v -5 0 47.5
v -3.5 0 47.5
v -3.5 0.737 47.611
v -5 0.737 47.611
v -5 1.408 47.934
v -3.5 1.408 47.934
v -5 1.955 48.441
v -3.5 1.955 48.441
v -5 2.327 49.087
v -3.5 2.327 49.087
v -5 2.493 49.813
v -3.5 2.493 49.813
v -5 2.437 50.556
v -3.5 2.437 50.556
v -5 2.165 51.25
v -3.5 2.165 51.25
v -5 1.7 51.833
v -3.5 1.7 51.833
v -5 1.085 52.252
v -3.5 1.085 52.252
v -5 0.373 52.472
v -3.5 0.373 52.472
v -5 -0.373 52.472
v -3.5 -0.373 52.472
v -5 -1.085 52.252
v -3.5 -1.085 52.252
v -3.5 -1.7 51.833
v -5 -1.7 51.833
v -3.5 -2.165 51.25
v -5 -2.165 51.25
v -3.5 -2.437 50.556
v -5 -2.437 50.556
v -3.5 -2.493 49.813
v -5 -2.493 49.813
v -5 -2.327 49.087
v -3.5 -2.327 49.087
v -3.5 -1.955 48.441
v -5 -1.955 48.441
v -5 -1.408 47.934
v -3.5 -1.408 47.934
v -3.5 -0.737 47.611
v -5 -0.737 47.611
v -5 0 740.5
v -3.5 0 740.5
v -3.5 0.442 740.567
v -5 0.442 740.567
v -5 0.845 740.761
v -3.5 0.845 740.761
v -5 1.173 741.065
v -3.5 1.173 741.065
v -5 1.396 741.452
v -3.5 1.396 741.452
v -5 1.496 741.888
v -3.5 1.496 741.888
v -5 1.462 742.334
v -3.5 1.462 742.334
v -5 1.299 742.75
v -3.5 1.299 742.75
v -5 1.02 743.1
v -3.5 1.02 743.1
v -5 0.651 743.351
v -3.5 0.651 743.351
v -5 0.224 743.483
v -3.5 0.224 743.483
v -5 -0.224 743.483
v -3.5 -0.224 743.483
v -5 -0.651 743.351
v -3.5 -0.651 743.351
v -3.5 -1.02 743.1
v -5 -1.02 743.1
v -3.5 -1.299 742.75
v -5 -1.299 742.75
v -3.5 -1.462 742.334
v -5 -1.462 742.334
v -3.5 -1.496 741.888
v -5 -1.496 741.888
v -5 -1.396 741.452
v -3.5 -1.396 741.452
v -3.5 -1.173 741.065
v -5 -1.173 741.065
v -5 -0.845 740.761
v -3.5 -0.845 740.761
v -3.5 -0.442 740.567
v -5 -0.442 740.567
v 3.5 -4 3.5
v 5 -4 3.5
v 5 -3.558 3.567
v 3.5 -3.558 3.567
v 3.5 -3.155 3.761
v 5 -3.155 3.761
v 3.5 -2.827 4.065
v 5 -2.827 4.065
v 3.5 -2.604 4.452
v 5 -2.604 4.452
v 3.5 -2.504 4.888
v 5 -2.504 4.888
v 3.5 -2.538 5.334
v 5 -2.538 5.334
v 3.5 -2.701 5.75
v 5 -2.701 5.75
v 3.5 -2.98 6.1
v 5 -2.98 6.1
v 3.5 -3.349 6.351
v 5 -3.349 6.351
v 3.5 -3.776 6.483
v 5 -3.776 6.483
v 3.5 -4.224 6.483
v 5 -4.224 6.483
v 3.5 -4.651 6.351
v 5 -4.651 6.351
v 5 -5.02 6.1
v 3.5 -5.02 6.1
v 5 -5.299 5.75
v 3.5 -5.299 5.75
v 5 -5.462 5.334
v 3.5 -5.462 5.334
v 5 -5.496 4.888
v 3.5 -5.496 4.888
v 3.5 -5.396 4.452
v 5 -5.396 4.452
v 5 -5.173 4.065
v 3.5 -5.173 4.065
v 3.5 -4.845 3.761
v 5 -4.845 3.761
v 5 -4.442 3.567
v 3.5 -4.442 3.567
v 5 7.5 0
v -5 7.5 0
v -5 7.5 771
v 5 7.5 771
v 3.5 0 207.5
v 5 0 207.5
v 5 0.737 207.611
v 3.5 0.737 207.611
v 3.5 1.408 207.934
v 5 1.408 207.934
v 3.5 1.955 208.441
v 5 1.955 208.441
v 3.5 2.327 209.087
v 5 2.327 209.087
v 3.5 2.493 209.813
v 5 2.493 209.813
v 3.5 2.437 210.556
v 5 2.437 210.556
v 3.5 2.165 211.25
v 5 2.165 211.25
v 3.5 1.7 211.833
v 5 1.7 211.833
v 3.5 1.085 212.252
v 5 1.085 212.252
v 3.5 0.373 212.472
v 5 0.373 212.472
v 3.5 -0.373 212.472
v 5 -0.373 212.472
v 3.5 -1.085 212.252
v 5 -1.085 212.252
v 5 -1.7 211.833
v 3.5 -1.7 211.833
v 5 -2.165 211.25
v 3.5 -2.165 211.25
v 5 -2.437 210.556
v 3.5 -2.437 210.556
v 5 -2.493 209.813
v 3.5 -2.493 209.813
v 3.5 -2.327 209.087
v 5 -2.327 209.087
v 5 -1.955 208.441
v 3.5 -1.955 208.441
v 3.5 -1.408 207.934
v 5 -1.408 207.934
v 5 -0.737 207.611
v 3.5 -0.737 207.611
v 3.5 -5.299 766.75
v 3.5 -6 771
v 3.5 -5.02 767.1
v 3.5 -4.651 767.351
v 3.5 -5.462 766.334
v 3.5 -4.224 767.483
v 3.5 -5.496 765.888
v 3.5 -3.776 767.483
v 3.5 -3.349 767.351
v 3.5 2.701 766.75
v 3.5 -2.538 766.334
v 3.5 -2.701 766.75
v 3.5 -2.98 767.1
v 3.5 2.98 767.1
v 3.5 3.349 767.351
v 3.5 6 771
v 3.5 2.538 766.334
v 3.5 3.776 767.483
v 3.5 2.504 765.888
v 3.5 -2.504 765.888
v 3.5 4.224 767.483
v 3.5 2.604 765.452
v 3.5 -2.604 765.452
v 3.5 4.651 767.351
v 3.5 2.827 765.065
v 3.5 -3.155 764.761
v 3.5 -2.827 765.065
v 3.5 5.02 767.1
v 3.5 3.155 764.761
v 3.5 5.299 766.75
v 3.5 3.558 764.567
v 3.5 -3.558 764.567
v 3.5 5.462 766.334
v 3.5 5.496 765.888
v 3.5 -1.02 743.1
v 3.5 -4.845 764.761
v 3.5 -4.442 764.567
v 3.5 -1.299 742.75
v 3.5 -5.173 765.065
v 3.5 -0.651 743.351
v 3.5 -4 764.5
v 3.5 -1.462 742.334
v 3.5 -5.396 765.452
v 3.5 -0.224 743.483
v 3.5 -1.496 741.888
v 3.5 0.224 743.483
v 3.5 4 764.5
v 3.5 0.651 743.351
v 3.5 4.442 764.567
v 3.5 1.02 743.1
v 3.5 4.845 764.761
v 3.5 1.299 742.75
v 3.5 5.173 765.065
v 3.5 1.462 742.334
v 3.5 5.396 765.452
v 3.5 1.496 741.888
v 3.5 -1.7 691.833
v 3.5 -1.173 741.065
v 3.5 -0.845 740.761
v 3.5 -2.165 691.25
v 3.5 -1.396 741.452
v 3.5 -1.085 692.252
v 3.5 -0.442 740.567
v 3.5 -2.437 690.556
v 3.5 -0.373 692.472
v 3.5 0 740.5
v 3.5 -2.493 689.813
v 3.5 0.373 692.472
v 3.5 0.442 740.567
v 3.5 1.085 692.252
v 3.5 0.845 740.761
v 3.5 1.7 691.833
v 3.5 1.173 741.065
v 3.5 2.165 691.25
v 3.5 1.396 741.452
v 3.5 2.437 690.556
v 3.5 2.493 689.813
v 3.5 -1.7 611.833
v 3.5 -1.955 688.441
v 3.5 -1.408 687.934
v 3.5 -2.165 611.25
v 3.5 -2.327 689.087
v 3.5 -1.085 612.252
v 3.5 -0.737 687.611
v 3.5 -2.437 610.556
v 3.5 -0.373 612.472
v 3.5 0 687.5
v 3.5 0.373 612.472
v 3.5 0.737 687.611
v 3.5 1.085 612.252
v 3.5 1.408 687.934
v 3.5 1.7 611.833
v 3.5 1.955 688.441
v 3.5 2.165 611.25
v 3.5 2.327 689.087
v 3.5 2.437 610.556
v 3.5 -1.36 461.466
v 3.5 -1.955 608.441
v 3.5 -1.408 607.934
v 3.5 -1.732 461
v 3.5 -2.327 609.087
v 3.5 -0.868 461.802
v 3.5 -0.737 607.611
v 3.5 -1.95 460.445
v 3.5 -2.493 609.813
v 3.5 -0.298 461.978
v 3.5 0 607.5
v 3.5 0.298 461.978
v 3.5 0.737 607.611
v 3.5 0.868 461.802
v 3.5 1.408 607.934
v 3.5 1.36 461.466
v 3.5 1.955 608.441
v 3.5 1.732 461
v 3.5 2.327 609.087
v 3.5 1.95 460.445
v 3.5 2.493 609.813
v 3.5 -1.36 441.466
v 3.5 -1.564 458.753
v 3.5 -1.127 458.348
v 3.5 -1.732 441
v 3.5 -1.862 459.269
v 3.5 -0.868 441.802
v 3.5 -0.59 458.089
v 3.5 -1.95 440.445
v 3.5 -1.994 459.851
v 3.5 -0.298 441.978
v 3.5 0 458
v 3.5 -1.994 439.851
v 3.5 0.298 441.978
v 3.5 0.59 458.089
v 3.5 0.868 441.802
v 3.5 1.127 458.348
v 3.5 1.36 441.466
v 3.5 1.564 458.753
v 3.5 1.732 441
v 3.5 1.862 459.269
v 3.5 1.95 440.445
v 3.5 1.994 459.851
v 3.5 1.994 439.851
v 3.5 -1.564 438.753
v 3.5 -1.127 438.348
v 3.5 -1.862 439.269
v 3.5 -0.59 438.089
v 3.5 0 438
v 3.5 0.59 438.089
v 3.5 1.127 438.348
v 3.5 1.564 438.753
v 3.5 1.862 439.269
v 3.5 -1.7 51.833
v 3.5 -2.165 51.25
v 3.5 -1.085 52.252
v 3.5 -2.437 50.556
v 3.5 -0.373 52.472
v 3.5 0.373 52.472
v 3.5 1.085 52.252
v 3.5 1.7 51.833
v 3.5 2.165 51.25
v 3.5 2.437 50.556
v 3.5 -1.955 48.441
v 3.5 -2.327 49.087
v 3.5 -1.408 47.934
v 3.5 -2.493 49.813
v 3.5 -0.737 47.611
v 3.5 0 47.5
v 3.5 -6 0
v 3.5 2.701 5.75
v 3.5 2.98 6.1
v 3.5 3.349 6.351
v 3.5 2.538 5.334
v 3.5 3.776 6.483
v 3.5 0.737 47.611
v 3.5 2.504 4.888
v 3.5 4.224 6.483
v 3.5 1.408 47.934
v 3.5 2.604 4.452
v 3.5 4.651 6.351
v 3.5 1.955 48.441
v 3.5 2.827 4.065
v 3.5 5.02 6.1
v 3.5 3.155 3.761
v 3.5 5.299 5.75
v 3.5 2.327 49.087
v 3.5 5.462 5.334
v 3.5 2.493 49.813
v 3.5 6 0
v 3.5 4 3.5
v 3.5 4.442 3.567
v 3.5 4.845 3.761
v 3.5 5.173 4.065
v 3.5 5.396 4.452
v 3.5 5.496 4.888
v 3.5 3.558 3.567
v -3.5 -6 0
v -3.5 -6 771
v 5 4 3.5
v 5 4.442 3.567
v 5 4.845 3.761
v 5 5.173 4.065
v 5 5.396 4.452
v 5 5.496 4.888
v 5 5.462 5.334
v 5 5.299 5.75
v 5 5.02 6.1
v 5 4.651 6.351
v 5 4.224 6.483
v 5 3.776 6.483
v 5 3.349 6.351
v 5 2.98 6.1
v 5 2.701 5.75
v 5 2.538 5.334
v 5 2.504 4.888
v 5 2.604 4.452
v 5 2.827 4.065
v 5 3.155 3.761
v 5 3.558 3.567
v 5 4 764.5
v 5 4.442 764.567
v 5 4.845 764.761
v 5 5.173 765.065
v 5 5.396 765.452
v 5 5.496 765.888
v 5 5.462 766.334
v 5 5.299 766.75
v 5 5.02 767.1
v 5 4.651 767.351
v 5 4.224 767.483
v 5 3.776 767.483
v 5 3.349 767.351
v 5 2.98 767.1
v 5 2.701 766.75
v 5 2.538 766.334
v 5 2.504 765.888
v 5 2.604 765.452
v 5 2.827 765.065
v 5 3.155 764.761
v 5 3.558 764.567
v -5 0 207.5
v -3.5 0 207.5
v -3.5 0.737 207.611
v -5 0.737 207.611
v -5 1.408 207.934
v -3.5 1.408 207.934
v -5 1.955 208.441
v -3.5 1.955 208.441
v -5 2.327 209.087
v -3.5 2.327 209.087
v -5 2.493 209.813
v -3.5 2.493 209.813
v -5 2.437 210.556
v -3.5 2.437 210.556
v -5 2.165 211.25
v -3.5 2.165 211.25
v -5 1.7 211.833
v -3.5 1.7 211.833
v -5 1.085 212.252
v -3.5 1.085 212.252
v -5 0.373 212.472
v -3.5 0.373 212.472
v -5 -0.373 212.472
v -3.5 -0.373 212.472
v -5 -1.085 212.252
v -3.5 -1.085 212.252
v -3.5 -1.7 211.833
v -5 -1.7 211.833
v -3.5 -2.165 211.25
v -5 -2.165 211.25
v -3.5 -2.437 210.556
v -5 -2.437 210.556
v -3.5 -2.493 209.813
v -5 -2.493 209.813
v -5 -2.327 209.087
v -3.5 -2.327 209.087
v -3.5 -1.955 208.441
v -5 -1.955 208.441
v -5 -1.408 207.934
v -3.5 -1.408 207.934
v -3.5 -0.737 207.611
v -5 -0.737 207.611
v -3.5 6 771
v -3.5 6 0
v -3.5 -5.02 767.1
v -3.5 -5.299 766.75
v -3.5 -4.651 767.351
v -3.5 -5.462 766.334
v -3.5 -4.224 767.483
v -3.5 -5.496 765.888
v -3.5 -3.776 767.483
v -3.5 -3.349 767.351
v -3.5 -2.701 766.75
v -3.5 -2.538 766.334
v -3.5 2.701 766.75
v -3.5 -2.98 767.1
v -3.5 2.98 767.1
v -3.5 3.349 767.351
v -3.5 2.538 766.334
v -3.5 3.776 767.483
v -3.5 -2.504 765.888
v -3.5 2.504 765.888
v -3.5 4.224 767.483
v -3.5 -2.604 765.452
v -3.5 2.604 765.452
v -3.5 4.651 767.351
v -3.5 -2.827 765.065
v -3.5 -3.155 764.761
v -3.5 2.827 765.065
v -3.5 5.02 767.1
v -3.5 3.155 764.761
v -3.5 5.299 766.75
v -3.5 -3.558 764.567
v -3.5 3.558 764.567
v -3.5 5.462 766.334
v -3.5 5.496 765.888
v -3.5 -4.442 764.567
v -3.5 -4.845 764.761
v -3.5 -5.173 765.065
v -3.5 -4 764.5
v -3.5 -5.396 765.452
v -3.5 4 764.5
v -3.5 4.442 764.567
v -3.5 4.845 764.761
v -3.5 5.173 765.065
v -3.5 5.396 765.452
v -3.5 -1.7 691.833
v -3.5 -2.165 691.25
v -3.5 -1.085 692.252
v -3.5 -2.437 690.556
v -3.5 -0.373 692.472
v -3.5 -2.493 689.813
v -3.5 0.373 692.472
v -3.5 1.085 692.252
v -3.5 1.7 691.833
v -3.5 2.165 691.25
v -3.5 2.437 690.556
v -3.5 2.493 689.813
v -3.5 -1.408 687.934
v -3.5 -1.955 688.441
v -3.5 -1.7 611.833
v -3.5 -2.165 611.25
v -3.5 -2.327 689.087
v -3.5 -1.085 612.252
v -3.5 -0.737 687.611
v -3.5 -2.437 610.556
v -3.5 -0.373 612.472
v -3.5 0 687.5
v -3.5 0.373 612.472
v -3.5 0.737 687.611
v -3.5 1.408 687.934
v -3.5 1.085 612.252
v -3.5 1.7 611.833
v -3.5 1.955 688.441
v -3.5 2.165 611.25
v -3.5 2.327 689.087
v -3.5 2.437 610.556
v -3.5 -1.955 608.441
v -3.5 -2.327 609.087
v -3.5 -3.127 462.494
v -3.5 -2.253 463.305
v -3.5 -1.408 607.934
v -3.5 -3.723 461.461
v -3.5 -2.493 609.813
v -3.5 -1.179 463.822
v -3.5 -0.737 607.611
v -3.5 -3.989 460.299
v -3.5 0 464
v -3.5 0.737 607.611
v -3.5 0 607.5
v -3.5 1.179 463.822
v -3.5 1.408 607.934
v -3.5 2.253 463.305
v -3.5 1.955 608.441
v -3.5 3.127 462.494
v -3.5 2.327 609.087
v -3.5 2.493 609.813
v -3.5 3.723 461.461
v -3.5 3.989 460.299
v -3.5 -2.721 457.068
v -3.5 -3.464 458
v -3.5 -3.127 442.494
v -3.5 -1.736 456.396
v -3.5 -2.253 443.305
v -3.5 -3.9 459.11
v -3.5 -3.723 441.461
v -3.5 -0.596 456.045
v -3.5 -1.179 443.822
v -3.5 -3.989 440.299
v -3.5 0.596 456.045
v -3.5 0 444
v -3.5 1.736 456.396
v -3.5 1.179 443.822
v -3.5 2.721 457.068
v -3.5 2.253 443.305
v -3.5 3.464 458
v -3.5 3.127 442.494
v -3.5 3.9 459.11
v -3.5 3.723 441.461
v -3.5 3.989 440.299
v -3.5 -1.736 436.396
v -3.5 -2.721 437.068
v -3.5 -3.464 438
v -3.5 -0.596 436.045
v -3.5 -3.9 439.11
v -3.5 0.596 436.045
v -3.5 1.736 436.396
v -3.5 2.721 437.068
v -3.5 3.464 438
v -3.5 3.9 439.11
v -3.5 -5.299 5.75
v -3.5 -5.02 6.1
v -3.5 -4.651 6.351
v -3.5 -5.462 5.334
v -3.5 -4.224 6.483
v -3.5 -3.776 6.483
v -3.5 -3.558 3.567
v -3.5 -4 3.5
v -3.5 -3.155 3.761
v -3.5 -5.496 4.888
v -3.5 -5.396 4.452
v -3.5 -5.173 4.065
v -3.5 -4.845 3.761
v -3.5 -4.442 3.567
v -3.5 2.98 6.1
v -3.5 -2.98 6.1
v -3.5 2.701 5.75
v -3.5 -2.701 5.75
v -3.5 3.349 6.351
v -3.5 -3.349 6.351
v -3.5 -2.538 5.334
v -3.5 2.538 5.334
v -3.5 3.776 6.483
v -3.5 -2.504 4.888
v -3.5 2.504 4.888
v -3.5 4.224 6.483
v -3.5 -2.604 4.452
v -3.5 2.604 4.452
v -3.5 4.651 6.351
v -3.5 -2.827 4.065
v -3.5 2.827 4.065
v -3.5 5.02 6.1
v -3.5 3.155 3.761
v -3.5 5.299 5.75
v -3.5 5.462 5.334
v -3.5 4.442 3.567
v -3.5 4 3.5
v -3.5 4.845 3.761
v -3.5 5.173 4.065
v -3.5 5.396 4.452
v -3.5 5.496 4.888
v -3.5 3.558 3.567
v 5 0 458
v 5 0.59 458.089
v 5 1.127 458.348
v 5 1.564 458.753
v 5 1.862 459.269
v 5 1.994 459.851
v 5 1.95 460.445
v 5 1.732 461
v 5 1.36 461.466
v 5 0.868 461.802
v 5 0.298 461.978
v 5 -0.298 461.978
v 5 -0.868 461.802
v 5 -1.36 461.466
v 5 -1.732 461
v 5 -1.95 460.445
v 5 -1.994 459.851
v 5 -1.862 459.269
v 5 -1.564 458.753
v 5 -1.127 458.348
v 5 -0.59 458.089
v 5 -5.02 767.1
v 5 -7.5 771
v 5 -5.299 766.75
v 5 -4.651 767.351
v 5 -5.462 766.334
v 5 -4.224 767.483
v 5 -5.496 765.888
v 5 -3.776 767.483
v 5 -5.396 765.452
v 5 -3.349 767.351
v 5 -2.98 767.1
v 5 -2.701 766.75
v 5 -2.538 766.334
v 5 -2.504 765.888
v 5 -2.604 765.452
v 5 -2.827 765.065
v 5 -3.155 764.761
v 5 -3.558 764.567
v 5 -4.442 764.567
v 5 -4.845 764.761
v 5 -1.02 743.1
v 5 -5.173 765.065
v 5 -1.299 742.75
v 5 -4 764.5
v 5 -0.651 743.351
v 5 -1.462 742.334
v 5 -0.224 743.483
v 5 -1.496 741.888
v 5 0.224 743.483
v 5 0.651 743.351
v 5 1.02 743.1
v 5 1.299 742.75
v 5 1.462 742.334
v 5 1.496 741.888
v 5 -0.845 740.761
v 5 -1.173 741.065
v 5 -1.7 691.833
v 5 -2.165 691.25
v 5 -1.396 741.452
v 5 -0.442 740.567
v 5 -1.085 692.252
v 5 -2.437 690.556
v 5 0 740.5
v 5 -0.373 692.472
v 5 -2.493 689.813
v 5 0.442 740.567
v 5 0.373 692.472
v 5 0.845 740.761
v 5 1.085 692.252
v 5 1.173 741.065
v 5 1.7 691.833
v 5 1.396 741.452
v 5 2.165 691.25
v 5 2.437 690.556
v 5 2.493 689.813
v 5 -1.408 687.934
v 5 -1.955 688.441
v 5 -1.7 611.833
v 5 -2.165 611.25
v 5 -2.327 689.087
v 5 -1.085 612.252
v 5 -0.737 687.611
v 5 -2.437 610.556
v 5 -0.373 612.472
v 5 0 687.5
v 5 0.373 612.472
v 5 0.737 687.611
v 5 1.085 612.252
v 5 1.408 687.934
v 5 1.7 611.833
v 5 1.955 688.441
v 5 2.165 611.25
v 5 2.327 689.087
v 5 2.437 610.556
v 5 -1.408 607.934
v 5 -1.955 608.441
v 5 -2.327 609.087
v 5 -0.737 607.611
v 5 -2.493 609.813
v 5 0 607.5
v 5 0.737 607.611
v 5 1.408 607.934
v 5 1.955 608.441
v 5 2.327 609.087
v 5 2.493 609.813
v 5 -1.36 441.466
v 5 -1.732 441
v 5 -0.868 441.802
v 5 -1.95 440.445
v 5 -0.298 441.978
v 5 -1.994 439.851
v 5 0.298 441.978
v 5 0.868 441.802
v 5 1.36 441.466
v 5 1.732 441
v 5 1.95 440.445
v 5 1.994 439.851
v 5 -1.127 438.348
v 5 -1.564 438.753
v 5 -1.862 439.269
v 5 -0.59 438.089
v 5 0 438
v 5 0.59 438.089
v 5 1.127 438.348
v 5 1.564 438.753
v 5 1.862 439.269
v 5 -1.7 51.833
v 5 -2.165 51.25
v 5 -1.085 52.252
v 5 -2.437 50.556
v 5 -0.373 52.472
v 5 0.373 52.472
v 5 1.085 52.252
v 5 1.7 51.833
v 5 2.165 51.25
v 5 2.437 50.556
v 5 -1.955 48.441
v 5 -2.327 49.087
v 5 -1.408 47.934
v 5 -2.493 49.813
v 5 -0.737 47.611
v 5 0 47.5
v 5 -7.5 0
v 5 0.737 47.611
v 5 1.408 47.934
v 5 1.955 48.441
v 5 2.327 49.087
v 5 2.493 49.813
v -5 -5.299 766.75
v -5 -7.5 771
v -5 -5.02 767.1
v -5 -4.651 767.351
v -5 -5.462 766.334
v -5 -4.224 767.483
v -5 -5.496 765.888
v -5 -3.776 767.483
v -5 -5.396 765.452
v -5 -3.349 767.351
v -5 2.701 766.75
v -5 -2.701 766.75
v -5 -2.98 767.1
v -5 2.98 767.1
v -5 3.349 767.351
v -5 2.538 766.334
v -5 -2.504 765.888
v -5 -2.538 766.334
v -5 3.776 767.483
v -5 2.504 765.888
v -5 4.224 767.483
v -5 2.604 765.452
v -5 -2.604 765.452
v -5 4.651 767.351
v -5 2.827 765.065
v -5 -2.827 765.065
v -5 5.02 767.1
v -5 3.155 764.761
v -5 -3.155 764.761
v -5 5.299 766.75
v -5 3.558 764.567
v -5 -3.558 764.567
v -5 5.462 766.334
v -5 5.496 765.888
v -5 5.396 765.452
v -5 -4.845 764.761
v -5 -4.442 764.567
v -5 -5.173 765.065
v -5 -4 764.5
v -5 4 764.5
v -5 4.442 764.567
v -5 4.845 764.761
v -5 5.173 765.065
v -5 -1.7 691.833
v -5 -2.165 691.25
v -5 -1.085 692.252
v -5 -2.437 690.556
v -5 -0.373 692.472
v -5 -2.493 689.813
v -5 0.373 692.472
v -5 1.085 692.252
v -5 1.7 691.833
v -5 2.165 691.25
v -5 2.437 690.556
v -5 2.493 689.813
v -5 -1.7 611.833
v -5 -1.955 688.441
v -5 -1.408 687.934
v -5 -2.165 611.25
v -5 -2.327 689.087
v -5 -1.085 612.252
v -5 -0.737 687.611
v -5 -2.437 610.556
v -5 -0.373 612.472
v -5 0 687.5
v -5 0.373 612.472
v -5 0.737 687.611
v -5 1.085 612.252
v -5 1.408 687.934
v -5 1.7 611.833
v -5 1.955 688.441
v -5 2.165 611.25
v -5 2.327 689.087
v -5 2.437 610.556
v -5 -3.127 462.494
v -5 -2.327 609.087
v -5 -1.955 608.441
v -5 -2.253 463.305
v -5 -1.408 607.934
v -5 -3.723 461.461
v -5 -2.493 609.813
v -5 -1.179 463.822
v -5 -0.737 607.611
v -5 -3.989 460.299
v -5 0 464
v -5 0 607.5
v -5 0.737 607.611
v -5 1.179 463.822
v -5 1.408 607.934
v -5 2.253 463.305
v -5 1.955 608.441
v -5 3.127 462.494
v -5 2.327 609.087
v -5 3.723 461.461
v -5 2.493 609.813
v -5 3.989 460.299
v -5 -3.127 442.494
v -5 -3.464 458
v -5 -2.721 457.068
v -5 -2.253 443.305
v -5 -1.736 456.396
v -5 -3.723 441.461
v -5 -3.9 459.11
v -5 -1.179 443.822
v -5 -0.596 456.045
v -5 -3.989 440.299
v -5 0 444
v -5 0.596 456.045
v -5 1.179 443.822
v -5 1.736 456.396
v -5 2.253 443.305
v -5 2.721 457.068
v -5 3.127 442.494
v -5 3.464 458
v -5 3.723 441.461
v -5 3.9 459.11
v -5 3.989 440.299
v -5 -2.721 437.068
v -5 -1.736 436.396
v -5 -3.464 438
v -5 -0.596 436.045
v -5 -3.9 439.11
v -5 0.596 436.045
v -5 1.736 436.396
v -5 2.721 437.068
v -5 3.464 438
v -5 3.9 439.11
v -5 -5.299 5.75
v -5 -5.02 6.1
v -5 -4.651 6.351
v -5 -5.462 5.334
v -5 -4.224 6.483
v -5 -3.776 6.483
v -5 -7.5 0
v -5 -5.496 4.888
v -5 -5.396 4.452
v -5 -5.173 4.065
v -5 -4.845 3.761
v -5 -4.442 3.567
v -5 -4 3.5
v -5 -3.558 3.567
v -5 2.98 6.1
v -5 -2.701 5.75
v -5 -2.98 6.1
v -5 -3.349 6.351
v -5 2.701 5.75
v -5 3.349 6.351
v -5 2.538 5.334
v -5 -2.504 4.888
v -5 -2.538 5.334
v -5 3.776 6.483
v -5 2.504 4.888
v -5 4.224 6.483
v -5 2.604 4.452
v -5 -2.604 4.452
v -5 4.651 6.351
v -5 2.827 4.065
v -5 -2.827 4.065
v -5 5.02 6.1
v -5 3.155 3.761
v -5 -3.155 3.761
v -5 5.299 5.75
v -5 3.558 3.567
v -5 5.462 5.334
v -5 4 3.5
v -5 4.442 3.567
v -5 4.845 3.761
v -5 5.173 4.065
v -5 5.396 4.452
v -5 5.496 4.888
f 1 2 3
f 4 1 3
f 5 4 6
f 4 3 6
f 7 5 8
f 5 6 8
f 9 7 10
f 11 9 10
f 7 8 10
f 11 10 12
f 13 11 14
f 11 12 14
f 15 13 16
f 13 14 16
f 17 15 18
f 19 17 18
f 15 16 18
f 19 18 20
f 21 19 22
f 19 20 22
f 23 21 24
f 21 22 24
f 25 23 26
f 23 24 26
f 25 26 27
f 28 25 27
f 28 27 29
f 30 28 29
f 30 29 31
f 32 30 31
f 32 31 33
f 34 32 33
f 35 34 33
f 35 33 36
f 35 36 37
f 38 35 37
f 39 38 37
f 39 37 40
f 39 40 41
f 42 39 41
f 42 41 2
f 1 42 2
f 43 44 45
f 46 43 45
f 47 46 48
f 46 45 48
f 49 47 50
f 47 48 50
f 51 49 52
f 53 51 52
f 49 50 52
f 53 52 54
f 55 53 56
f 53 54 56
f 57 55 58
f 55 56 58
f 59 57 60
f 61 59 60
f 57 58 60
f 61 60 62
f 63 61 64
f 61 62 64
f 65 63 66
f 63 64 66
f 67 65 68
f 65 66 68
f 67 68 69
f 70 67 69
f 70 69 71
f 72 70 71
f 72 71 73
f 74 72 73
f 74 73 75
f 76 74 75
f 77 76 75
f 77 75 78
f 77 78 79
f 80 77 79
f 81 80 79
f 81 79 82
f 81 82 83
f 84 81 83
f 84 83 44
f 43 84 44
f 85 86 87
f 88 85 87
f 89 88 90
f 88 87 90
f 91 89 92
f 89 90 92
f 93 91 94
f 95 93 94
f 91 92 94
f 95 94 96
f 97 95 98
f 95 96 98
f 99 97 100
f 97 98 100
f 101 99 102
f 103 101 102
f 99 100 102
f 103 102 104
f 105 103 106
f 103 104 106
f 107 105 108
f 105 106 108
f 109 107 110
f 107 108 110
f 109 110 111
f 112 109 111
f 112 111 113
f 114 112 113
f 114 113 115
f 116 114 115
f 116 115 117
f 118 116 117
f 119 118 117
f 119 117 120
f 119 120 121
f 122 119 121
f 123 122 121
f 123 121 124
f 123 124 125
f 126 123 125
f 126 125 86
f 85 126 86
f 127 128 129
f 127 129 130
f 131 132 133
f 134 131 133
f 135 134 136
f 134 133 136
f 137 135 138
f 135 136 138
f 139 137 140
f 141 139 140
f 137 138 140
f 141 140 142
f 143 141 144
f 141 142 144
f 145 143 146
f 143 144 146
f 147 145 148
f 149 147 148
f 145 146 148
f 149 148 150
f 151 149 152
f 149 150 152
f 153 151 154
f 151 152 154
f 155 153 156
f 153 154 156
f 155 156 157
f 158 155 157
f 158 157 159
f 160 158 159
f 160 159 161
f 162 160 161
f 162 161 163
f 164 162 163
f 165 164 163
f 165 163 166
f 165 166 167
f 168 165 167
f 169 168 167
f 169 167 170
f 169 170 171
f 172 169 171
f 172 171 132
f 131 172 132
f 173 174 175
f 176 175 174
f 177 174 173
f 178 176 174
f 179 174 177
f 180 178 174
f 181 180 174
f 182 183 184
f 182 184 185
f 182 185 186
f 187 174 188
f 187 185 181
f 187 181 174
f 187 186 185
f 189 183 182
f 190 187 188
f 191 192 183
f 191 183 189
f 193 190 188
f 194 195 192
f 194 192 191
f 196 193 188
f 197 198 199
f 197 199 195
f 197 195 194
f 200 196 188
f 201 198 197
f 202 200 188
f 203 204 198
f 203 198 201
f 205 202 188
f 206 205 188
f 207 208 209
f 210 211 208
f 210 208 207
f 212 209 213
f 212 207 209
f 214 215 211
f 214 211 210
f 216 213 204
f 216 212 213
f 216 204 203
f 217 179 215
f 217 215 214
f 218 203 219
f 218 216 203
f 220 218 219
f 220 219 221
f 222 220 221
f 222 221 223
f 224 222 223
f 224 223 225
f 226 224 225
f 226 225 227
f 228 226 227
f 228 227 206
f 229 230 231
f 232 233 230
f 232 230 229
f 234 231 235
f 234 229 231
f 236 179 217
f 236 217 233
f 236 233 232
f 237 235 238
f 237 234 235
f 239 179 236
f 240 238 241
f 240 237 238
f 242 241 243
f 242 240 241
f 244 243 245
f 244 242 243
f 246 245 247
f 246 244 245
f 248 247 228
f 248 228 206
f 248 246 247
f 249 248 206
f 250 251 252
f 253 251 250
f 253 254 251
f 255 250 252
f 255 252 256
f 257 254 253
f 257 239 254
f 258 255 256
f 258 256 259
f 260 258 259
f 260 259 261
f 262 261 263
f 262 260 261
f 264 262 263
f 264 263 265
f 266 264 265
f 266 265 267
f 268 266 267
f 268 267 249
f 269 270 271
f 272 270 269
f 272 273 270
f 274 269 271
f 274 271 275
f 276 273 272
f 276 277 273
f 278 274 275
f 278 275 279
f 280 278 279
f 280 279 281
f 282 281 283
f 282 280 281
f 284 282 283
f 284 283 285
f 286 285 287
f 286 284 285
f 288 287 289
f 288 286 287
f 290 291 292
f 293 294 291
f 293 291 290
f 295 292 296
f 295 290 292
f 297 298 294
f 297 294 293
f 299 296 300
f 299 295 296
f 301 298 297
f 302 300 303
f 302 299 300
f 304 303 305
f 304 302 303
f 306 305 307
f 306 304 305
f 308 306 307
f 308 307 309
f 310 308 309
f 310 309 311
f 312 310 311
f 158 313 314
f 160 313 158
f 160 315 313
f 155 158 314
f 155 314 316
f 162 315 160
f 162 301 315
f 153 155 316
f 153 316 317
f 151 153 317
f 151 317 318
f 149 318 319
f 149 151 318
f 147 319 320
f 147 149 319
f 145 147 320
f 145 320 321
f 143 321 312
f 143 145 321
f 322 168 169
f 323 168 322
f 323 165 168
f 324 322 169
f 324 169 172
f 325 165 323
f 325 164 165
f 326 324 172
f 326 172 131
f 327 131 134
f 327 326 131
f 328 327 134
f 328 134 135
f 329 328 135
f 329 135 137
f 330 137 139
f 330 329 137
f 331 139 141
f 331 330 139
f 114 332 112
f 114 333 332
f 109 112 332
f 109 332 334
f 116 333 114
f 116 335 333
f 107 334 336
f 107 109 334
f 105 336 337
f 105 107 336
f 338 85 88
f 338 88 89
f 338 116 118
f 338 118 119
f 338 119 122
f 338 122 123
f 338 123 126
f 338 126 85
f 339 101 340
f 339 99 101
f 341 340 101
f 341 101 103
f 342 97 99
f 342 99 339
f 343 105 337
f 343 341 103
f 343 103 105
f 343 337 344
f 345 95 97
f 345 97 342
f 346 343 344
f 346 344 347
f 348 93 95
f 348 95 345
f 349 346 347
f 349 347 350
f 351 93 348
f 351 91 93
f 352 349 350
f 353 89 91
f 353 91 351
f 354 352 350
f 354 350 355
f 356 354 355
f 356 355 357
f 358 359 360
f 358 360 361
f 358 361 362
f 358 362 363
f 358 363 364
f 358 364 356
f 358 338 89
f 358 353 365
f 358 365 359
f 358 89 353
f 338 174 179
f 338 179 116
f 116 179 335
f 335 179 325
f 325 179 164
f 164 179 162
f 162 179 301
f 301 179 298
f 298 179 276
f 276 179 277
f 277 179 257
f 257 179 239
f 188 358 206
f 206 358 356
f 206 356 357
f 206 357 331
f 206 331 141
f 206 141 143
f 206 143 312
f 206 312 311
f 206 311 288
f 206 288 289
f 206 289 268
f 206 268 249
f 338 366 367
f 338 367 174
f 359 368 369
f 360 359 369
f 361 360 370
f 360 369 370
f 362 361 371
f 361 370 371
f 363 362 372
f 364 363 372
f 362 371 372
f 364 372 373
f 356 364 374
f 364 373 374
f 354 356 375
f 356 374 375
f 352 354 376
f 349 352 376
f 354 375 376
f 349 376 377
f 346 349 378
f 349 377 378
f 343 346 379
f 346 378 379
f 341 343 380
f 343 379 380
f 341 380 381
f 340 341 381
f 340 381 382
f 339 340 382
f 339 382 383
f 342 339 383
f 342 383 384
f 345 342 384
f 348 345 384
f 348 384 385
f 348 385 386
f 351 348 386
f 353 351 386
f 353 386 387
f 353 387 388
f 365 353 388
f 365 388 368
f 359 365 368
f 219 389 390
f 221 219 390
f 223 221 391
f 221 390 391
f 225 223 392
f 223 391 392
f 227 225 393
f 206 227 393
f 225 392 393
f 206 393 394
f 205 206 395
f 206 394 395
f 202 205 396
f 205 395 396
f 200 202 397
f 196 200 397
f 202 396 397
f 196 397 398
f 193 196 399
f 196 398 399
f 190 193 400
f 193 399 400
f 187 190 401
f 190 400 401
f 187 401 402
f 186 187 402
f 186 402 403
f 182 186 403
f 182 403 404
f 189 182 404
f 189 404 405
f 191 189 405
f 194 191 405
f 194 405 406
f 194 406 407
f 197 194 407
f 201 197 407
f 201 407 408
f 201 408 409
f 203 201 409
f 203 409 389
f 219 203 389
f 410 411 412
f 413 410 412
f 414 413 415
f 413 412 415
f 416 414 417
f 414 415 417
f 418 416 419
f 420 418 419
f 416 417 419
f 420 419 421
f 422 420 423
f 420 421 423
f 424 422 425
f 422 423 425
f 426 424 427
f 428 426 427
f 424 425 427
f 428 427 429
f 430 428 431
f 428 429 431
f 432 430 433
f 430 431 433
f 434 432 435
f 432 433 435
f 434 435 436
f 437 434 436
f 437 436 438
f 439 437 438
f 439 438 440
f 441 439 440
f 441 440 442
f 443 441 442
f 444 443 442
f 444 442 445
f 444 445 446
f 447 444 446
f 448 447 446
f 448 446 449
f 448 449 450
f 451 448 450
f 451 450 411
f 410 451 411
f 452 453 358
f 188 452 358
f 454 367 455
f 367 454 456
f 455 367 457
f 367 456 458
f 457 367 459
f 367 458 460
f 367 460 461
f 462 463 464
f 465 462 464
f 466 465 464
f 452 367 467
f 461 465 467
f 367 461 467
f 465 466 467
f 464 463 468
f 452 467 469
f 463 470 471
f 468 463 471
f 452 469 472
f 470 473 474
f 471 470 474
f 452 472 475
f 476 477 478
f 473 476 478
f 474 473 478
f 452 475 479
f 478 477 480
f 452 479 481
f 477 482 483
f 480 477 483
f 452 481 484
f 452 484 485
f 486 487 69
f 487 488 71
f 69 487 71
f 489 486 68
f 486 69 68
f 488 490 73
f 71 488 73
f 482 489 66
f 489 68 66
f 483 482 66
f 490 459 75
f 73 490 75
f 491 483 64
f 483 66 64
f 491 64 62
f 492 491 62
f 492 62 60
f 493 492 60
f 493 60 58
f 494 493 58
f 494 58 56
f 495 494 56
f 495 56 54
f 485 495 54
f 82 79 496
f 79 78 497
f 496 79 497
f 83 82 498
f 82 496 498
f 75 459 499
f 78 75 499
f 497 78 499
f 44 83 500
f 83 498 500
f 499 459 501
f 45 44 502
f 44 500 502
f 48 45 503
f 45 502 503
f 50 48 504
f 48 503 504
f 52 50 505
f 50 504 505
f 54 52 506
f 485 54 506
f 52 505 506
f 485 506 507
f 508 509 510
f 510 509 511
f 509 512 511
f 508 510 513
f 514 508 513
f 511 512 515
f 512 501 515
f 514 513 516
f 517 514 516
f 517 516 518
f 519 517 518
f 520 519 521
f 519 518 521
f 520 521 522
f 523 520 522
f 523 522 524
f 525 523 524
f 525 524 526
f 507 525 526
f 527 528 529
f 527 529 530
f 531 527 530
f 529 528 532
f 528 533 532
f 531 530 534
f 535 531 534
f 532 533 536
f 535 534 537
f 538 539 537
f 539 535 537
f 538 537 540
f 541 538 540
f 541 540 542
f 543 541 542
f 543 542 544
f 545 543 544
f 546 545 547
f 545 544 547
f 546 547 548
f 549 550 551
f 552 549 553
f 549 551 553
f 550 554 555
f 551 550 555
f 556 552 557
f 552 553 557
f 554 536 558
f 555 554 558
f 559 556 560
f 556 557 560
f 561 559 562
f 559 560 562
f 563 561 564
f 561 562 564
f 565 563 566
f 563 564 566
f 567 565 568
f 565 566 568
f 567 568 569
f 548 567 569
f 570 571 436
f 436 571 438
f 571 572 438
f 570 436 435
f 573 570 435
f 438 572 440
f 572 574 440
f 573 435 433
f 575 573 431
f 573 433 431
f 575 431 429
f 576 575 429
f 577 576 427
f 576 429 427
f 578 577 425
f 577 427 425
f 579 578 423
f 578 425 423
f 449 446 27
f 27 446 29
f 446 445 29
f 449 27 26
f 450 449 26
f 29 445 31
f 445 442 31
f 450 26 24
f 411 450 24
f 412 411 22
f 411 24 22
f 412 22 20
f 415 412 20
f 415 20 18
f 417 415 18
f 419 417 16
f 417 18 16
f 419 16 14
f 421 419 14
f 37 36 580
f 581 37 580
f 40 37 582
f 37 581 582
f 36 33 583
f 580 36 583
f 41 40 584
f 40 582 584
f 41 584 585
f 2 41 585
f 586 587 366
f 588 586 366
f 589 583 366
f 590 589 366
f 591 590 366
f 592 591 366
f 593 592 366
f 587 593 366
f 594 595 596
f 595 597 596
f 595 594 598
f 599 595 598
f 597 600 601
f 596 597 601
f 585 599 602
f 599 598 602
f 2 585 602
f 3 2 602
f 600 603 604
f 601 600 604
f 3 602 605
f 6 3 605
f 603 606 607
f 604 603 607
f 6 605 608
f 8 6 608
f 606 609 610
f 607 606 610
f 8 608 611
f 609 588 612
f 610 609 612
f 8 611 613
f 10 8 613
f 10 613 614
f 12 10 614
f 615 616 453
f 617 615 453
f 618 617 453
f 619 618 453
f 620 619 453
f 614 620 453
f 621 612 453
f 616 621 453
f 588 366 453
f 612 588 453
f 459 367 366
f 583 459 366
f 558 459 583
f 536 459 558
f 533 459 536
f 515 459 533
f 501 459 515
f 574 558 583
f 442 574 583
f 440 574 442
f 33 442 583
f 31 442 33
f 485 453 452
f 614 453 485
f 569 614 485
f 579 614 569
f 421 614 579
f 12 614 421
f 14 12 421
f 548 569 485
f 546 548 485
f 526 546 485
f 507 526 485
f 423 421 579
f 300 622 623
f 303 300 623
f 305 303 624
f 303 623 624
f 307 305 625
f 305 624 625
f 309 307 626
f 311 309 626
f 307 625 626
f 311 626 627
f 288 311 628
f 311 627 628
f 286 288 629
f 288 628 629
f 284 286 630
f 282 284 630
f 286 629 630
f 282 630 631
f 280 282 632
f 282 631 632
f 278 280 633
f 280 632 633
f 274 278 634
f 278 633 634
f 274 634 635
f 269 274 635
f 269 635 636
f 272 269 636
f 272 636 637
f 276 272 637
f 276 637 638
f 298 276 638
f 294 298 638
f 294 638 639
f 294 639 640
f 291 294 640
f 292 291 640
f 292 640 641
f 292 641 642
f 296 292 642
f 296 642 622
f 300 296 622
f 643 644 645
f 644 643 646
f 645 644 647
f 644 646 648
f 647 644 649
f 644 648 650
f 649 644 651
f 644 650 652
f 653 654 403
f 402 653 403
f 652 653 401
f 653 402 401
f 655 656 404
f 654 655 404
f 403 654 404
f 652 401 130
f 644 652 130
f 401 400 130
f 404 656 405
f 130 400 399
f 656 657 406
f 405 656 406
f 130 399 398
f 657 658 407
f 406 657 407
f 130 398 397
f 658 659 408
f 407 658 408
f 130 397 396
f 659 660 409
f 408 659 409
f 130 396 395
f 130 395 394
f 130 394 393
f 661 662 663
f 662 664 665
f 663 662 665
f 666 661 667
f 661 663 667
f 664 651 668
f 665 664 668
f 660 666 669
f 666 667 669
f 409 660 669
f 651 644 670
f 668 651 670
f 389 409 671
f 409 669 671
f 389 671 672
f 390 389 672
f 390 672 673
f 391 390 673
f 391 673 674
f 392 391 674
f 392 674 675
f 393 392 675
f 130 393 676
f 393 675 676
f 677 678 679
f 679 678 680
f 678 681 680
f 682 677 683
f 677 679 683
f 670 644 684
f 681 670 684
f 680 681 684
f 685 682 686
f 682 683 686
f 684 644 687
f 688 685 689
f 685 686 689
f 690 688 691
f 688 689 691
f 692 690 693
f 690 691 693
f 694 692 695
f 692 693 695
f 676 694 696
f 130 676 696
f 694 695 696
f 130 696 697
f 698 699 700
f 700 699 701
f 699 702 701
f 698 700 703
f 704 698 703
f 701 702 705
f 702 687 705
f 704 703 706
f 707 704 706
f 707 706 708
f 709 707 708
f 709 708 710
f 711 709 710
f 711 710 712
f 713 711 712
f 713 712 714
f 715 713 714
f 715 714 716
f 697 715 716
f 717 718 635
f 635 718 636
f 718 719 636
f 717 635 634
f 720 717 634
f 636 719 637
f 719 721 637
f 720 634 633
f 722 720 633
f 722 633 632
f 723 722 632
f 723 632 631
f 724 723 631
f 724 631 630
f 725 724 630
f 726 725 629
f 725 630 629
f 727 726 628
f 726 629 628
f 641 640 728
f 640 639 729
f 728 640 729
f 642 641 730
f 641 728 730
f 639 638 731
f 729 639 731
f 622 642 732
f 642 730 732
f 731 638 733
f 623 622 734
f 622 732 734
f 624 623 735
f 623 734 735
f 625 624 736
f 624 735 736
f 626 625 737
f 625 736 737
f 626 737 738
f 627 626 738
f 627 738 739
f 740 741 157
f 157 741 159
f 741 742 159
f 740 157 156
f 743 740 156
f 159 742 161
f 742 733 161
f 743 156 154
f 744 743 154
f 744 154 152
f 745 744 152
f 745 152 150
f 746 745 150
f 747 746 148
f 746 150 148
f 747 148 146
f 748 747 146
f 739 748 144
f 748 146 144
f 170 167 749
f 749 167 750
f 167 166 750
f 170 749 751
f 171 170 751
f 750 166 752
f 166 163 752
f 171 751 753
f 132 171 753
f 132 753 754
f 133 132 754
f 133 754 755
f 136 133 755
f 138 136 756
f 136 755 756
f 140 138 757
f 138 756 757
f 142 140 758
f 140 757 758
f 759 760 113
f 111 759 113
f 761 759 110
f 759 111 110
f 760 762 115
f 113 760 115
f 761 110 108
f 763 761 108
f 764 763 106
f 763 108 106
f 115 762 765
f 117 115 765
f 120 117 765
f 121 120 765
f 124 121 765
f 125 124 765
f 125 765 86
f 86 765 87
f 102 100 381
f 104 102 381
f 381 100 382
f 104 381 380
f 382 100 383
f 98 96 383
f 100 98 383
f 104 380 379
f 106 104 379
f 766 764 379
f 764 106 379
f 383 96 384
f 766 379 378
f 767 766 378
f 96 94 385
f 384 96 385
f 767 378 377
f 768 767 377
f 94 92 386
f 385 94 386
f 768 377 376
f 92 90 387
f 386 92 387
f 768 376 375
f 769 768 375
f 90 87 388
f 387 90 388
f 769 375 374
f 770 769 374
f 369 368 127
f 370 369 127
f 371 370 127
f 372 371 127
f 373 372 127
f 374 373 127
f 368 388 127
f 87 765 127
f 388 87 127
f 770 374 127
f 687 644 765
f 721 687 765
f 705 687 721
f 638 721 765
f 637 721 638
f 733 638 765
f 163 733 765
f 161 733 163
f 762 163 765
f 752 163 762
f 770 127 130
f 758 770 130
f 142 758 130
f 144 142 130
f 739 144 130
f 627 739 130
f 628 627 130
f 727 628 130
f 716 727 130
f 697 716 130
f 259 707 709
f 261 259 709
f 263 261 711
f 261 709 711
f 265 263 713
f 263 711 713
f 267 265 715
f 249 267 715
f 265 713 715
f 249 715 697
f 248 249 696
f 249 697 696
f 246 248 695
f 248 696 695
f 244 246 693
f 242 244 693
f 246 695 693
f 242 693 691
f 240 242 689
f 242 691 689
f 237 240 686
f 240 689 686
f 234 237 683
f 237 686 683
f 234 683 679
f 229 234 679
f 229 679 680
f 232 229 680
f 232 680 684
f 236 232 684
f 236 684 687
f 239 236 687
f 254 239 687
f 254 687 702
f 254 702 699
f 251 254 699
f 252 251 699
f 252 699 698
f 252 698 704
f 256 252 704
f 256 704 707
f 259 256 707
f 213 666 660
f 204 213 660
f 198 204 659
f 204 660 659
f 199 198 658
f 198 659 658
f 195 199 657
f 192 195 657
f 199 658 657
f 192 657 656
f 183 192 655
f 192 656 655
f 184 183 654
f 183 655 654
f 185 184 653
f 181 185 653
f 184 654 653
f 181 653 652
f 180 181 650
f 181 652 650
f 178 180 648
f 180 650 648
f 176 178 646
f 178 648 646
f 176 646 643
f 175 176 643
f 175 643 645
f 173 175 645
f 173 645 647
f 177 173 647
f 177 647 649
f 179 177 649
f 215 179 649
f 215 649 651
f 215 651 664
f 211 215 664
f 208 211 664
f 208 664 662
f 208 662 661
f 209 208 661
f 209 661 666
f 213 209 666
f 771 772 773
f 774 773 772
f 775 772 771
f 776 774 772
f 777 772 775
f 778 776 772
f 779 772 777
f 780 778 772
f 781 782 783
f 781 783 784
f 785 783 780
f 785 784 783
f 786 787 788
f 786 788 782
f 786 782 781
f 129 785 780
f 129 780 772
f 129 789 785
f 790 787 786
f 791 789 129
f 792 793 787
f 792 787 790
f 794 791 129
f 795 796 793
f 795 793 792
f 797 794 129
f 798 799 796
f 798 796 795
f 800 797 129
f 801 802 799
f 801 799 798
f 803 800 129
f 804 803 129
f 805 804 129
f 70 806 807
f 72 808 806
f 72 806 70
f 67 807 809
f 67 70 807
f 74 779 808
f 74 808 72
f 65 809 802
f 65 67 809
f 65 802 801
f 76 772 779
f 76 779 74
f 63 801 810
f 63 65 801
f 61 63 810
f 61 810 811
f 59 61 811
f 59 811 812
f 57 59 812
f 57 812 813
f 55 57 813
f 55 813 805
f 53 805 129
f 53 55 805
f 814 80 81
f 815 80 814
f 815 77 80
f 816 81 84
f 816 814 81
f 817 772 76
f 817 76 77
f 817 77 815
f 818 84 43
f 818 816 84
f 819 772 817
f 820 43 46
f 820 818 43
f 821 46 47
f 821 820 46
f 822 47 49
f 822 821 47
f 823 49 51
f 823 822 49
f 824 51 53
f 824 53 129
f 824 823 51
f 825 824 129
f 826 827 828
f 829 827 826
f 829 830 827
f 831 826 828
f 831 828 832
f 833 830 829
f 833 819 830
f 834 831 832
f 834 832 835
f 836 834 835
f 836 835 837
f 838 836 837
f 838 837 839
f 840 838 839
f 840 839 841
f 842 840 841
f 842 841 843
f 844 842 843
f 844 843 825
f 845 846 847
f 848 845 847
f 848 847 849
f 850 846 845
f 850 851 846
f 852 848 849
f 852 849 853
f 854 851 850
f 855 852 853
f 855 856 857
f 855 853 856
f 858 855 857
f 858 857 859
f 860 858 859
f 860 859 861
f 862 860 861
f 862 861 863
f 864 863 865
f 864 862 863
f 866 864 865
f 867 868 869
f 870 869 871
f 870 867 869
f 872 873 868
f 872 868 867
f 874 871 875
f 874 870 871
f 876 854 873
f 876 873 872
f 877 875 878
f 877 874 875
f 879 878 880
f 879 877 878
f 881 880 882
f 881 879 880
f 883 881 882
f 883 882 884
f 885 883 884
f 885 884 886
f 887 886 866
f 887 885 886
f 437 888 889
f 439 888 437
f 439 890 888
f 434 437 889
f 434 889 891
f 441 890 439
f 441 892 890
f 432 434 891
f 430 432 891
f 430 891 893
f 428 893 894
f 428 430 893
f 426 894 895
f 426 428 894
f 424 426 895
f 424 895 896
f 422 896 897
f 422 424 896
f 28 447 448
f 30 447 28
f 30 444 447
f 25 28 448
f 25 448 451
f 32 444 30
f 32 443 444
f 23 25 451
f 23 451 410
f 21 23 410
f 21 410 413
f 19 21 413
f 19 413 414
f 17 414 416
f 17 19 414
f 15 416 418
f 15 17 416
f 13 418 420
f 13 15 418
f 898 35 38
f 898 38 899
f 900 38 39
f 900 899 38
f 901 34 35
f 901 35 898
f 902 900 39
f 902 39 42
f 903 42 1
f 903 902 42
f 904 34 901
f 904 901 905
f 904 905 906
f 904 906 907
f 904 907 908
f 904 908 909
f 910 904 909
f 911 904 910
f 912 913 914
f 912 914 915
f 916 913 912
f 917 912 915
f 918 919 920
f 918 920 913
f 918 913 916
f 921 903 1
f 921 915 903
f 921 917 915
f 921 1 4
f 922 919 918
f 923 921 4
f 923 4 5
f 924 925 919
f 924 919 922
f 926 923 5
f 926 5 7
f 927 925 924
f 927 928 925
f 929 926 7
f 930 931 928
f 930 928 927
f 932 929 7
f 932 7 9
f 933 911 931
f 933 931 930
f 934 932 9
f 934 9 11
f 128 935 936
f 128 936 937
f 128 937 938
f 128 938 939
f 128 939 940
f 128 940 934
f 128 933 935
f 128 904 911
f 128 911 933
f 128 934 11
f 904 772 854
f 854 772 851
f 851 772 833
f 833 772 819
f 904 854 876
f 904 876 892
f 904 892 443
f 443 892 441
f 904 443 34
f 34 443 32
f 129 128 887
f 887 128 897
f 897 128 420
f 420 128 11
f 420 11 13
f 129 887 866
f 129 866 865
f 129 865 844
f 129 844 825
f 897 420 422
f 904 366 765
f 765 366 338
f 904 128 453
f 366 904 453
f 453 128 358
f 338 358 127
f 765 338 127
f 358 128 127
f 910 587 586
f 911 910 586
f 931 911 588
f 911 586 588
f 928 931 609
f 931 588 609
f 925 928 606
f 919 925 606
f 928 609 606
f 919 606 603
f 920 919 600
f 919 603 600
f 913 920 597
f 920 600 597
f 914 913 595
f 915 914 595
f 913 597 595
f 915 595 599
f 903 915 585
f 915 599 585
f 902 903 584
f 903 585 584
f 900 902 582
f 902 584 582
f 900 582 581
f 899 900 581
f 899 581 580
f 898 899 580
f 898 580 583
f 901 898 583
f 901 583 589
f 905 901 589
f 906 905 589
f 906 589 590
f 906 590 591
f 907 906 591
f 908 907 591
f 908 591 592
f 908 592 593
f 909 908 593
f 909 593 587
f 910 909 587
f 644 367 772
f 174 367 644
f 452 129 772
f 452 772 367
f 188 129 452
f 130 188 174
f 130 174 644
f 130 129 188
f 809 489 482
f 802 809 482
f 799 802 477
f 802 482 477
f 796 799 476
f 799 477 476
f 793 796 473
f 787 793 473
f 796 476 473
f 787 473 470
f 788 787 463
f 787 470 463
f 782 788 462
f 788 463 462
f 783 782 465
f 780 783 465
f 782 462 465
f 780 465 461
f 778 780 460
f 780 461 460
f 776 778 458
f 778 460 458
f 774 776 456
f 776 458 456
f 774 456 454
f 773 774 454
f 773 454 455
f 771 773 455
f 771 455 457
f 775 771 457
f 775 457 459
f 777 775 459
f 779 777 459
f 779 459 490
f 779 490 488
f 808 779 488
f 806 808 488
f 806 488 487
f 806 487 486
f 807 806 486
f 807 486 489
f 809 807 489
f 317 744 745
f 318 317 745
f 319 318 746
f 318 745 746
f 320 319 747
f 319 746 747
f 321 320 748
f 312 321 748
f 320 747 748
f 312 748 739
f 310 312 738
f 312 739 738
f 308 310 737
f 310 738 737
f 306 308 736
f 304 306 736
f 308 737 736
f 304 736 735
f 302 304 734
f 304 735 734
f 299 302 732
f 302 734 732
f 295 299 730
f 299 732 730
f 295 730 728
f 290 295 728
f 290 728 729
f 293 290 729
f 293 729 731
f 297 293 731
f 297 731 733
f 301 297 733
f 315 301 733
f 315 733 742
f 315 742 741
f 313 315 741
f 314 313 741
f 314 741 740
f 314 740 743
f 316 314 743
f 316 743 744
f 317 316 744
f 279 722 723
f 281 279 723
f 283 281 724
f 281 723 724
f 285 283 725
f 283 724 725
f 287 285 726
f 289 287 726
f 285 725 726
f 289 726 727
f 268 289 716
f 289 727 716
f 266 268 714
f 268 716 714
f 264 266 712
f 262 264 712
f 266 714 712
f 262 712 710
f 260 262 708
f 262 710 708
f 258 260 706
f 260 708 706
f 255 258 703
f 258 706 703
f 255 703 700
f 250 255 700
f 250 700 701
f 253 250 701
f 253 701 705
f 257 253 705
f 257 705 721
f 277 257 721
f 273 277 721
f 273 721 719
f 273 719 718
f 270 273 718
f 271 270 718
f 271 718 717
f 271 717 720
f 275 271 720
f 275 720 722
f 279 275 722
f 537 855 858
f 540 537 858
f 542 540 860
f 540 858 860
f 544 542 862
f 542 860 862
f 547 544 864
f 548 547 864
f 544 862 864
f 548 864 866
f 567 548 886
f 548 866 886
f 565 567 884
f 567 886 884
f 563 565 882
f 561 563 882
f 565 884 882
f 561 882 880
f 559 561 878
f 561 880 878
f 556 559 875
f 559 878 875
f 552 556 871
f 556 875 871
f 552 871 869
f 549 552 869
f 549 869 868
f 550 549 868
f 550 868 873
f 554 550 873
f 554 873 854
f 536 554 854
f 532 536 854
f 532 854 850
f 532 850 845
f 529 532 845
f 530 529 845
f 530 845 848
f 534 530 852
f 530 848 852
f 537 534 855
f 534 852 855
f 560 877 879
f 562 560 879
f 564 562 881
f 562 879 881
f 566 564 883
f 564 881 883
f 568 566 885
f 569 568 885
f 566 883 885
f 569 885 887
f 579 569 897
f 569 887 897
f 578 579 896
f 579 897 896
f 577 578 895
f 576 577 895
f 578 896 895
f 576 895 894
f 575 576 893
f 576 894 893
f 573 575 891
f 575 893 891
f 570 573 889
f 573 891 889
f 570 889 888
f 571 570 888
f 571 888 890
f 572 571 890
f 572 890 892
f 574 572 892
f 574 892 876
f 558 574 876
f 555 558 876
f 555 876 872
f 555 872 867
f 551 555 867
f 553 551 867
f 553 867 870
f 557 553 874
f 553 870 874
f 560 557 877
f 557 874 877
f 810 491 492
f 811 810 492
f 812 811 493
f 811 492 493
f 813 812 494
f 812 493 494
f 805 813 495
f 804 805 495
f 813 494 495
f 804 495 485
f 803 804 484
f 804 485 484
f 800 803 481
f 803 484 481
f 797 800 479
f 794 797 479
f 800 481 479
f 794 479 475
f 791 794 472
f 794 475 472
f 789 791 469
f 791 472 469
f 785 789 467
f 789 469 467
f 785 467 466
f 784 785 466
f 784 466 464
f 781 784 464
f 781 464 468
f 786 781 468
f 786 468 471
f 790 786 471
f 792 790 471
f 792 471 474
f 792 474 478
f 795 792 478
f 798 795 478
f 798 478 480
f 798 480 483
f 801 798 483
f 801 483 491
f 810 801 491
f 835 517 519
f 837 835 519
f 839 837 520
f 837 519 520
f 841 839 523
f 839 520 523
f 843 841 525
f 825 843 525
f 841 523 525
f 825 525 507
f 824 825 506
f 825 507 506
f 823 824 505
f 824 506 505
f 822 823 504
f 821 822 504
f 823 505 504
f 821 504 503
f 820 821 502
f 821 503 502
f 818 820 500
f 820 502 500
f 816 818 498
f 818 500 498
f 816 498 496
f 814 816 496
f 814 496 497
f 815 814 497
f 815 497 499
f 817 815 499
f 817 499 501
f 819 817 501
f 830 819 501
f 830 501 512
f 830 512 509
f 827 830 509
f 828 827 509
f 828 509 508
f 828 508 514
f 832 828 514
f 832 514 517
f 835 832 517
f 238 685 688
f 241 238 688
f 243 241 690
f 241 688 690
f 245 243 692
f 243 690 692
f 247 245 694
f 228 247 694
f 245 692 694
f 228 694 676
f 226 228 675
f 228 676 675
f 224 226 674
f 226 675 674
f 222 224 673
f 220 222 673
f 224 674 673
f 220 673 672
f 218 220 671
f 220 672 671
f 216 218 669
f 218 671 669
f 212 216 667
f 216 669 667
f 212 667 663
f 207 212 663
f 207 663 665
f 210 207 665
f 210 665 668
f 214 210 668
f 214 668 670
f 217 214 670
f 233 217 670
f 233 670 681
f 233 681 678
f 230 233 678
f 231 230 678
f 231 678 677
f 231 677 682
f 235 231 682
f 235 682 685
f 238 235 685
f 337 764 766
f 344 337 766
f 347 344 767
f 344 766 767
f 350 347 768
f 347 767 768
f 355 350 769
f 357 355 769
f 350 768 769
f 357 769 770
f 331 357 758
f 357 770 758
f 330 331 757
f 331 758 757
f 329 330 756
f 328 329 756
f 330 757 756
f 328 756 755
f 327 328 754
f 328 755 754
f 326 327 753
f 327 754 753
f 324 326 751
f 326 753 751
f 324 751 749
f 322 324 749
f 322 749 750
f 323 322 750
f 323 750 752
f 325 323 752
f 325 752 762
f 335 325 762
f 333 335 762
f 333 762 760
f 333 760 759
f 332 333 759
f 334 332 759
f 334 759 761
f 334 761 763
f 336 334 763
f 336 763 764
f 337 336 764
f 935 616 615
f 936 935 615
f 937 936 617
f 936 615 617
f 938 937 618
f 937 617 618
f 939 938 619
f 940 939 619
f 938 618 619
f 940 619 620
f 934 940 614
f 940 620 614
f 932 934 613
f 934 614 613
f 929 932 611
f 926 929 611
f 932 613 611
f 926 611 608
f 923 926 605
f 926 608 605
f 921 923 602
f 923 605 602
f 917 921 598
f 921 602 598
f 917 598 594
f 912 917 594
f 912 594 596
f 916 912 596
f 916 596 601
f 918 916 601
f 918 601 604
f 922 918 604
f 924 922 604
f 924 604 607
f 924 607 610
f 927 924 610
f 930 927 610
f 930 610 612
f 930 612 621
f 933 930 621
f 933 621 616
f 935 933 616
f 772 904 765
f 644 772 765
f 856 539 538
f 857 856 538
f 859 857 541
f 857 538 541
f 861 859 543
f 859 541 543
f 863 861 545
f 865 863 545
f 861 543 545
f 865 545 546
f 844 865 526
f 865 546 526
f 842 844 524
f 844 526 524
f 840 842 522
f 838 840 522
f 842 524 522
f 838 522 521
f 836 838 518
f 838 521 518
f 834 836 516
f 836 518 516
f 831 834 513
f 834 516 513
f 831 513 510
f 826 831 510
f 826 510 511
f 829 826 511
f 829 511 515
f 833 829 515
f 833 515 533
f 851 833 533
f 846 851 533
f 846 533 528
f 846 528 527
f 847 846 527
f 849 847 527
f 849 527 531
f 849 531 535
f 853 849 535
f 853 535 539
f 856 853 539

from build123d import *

# Parameters (mm, degrees)
SKETCH_1_W          = 10
SKETCH_1_H          = 15
SKETCH_1_W_2        = 7
SKETCH_1_H_2        = 12
EXTRUDE_1_DEPTH     = 771
SKETCH_2_R          = 1.5
SKETCH_2_R_2        = 2.5
SKETCH_2_R_3        = 2
CUT_EXTRUDE_1_DEPTH = 772.101322784
SKETCH_3_R          = 4
CUT_EXTRUDE_2_DEPTH = 1.5


with BuildPart() as part:
    # ｽｹｯﾁ1 → 押し出し-薄板1 (new body)
    with BuildSketch(Plane.XY):
        Rectangle(SKETCH_1_W, SKETCH_1_H)
        Rectangle(SKETCH_1_W_2, SKETCH_1_H_2, mode=Mode.SUBTRACT)
    extrude(amount=EXTRUDE_1_DEPTH)

    # ｽｹｯﾁ2 → ｶｯﾄ - 押し出し1 (cut, through all)
    with BuildSketch(Plane(origin=(5, 0, 0), x_dir=(0, 0, -1), z_dir=(1, 0, 0))):
        with Locations((-5, 4)):
            Circle(SKETCH_2_R)
        with Locations((-5, -4)):
            Circle(SKETCH_2_R)
        with Locations((-766, 4)):
            Circle(SKETCH_2_R)
        with Locations((-766, -4)):
            Circle(SKETCH_2_R)
        with Locations((-50, 0)):
            Circle(SKETCH_2_R_2)
        with Locations((-742, 0)):
            Circle(SKETCH_2_R)
        with Locations((-690, 0)):
            Circle(SKETCH_2_R_2)
        with Locations((-440, 0)):
            Circle(SKETCH_2_R_3)
        with Locations((-460, 0)):
            Circle(SKETCH_2_R_3)
        with Locations((-610, 0)):
            Circle(SKETCH_2_R_2)
        with Locations((-210, 0)):
            Circle(SKETCH_2_R_2)
    extrude(amount=-CUT_EXTRUDE_1_DEPTH, mode=Mode.SUBTRACT)

    # ｽｹｯﾁ3 → ｶｯﾄ - 押し出し2 (cut)
    with BuildSketch(Plane.ZY.offset(5)):
        with Locations((440, 0)):
            Circle(SKETCH_3_R)
        with Locations((460, 0)):
            Circle(SKETCH_3_R)
    extrude(amount=-CUT_EXTRUDE_2_DEPTH, mode=Mode.SUBTRACT)


solid = part.part
